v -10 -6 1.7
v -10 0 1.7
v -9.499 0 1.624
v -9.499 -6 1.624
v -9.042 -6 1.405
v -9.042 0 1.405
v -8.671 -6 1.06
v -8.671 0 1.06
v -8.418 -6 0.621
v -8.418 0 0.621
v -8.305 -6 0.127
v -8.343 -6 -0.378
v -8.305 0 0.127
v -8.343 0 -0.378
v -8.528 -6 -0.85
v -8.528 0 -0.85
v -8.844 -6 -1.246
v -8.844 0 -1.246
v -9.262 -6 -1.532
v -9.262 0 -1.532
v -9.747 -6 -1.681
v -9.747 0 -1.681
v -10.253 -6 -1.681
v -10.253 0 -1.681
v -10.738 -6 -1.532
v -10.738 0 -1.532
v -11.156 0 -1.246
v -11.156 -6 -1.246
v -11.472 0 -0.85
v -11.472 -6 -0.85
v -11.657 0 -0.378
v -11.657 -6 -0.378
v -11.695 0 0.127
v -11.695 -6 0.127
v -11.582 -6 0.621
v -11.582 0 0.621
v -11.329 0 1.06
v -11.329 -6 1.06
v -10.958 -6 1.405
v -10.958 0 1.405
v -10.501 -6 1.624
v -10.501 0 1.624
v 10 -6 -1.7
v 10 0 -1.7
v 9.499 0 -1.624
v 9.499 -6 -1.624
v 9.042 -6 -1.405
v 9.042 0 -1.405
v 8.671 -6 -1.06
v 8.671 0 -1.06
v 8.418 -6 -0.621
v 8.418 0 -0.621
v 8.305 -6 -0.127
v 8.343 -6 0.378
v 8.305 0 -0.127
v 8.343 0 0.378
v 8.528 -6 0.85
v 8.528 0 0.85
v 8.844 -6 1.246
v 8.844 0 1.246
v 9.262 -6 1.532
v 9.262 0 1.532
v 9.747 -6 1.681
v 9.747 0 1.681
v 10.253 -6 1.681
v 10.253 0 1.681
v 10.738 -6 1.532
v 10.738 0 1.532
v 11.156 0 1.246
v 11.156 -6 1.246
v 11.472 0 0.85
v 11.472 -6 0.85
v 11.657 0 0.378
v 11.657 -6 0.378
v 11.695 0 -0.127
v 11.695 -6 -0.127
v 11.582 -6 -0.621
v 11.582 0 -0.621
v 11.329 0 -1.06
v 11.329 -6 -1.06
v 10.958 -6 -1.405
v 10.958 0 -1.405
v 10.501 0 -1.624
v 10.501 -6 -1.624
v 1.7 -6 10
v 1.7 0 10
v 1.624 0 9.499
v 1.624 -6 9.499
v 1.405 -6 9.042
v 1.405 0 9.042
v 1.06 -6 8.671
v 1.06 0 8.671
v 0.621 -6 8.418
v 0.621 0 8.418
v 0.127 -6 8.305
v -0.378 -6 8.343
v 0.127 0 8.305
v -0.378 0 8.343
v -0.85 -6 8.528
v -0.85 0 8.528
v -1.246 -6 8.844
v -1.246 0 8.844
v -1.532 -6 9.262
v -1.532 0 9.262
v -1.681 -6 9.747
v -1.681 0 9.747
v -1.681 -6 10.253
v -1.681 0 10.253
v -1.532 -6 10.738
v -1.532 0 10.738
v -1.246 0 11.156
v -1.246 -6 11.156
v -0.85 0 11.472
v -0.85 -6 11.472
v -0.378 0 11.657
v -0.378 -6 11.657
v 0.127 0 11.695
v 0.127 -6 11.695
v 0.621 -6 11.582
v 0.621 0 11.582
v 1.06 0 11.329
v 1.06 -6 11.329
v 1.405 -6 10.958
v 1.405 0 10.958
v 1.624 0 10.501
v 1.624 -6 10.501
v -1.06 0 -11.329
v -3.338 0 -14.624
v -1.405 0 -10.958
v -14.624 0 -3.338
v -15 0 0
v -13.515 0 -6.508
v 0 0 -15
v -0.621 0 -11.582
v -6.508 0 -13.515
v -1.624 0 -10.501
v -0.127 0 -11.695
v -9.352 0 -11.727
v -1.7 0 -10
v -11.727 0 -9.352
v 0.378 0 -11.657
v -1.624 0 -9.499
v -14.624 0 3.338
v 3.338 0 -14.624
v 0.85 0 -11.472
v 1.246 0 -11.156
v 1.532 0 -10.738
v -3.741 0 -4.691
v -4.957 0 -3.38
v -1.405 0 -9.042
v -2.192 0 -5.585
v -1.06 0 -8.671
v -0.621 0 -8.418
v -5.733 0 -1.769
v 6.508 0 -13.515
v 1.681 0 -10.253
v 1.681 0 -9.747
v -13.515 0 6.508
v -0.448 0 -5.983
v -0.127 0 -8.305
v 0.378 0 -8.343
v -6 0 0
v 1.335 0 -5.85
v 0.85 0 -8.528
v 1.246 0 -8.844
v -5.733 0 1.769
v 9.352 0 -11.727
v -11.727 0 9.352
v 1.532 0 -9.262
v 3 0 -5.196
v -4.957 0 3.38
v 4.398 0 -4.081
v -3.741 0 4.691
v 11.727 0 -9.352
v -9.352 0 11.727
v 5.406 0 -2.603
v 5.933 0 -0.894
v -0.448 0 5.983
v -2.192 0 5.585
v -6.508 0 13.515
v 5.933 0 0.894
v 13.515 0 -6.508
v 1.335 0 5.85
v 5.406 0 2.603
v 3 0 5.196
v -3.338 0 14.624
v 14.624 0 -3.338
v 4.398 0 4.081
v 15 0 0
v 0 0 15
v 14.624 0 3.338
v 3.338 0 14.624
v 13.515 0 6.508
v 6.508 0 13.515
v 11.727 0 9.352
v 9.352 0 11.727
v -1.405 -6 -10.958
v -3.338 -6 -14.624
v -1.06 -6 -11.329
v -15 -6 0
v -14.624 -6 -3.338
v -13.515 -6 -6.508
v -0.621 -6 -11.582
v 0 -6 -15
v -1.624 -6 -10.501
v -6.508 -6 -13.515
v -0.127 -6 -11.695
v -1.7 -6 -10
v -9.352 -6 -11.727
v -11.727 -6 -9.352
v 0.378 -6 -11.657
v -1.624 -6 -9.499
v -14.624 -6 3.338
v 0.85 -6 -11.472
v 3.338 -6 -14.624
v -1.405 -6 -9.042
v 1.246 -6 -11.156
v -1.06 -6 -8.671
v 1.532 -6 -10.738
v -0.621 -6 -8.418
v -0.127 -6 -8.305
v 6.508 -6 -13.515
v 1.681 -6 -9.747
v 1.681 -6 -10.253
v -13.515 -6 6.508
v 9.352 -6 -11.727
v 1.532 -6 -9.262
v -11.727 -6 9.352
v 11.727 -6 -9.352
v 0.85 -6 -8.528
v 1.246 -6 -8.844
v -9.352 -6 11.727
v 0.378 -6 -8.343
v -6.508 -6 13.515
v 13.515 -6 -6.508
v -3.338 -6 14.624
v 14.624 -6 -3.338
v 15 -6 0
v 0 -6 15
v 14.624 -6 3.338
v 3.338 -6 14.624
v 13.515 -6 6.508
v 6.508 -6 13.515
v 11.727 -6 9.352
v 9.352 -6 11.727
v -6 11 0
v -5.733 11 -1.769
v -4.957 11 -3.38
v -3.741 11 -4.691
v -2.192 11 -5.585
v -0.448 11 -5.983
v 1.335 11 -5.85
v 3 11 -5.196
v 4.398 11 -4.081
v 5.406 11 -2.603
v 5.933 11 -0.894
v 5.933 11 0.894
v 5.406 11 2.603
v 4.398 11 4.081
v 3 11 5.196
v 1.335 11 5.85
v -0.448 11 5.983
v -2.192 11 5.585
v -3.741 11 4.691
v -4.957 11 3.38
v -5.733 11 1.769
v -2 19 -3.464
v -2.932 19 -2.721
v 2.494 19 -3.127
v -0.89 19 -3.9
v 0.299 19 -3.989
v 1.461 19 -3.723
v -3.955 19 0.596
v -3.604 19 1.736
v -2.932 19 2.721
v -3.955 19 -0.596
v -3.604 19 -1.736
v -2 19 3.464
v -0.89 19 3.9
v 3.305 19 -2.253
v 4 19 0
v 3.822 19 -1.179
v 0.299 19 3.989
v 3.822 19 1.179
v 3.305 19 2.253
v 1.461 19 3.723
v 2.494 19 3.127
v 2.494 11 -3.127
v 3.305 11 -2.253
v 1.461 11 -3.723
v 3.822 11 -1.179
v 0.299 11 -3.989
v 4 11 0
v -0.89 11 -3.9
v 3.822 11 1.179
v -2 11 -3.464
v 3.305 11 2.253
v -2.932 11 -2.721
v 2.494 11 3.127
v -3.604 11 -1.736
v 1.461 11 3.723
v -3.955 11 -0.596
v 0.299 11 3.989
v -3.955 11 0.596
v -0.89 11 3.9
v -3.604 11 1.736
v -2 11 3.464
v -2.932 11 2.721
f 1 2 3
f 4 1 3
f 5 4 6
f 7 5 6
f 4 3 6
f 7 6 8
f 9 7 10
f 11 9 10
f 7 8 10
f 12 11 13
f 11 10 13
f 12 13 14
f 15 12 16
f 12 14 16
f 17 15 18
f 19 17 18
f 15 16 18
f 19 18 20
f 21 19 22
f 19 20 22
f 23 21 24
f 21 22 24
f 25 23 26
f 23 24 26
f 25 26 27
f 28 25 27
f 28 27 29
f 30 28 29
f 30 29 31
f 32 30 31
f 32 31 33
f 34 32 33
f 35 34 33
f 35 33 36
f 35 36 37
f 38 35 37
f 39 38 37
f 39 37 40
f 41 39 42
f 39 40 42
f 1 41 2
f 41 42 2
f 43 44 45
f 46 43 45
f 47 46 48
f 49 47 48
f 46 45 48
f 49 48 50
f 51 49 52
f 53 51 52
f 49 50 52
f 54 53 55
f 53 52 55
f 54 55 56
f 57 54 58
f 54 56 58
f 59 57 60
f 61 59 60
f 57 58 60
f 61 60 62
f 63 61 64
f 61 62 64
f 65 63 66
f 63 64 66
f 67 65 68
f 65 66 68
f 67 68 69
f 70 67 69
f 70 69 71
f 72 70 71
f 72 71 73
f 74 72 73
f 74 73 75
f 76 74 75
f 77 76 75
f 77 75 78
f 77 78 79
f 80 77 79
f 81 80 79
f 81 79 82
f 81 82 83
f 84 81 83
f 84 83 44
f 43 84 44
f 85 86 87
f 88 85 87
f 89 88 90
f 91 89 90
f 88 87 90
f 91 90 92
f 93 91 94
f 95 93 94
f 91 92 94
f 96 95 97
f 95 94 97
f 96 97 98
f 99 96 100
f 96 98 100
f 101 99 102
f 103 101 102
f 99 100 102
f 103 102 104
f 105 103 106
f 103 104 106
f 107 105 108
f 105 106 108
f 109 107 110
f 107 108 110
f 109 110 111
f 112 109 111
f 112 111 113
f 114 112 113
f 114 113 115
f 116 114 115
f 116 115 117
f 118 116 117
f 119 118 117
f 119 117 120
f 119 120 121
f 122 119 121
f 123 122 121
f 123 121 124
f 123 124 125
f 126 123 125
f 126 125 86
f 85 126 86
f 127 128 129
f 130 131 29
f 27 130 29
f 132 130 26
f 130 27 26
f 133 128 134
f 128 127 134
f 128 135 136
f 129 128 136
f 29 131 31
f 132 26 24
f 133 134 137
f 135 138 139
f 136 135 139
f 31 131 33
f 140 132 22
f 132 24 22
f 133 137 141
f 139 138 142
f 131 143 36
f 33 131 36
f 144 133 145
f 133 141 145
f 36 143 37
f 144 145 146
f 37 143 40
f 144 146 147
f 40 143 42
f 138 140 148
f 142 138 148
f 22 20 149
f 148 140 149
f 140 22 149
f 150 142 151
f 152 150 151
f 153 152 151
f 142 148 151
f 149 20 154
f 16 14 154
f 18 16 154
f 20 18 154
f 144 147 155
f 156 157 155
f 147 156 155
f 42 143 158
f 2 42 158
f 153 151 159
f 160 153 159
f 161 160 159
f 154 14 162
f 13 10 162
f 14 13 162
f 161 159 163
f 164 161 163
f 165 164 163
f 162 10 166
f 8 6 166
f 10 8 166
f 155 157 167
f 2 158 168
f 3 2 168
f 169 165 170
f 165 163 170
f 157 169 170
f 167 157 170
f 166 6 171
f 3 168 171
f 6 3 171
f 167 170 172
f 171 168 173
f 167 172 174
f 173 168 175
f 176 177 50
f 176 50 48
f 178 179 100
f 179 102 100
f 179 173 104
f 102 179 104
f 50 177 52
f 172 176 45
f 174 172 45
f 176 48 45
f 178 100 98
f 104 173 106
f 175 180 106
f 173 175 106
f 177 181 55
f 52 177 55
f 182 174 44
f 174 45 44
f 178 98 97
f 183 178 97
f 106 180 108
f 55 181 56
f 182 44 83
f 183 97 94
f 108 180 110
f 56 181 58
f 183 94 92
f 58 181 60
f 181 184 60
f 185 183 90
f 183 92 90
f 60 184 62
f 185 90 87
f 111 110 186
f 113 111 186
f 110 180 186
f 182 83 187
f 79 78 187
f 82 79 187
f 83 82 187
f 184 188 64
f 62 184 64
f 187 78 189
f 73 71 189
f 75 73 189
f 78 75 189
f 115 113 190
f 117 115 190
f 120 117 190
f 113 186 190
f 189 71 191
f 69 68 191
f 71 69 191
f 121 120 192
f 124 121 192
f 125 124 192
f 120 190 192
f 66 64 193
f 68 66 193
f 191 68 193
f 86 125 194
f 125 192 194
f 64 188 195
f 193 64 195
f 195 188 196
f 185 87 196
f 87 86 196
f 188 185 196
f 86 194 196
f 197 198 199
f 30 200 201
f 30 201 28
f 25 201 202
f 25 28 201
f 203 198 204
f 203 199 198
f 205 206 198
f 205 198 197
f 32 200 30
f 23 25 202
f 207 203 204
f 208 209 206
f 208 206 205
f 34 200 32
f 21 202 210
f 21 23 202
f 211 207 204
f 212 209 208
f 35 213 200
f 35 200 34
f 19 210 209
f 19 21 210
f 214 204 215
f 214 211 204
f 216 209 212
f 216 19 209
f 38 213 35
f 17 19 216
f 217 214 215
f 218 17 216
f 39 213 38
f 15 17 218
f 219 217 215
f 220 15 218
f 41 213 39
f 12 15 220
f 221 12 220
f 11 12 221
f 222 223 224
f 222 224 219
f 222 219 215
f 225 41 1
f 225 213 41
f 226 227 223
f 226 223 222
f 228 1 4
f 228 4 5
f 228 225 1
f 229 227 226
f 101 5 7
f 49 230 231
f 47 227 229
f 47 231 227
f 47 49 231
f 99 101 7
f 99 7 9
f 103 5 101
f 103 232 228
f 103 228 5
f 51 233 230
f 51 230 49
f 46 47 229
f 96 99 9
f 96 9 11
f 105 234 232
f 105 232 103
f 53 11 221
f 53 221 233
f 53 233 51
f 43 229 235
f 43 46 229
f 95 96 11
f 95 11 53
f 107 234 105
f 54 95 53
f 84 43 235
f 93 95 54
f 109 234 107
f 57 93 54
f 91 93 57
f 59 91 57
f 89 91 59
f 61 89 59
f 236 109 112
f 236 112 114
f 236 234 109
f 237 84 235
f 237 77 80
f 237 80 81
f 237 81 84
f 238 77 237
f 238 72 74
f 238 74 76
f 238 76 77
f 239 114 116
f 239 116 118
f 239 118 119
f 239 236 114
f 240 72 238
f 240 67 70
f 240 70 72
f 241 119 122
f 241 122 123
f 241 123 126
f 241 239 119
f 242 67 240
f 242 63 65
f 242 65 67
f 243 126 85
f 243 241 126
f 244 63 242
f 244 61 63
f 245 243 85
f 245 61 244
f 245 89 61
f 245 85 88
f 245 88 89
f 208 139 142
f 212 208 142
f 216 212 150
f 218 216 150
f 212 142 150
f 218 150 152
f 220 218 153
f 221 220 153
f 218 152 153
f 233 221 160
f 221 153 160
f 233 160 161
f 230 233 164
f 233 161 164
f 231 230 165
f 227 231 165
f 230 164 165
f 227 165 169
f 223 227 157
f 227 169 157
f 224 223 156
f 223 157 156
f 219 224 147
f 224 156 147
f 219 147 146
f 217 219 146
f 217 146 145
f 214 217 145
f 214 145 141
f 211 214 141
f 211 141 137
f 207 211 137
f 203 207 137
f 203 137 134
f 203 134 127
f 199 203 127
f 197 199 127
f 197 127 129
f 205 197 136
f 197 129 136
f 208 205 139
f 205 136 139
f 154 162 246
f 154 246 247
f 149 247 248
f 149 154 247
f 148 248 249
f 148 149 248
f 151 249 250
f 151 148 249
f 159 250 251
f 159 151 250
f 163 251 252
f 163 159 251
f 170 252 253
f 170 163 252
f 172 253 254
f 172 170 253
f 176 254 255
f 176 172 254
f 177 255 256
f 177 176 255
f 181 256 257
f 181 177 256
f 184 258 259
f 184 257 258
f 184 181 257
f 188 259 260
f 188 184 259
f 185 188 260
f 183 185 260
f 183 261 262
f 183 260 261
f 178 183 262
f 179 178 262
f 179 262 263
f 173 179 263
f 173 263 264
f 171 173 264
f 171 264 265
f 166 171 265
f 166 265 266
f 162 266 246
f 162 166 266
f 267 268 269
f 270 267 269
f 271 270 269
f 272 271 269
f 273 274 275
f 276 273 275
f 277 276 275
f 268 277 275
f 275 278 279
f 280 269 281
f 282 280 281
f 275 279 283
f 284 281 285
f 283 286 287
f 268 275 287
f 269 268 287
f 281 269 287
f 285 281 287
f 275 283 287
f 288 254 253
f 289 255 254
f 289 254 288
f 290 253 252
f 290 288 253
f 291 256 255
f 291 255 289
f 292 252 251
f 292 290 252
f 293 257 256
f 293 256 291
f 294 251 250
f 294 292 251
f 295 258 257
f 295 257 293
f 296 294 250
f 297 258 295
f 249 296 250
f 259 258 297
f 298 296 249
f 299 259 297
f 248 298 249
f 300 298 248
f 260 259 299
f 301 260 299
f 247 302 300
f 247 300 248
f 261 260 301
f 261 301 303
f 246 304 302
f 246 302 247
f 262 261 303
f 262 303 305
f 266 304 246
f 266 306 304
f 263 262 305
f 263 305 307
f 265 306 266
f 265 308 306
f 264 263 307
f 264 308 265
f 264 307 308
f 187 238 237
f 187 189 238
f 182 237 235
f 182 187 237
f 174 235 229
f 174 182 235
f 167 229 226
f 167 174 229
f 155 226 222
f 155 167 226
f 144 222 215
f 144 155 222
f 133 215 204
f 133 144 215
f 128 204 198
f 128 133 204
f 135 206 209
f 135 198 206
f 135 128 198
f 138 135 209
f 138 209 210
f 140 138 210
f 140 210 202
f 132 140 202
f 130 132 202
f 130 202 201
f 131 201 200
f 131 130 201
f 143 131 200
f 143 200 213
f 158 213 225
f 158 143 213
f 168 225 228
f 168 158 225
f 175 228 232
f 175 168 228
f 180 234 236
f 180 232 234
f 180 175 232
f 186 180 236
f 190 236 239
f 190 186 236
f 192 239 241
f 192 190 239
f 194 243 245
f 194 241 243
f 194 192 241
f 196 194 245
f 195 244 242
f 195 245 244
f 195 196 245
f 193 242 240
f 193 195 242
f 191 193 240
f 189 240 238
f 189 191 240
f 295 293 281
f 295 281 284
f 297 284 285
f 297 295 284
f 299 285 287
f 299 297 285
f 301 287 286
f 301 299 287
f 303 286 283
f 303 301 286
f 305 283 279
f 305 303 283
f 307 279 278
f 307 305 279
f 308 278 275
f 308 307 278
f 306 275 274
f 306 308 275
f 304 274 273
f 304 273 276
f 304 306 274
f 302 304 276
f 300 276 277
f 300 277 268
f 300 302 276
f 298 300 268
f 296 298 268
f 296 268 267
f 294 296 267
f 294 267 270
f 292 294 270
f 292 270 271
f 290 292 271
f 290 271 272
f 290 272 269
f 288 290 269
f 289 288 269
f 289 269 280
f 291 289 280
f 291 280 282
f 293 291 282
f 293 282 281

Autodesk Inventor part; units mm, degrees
ref_plane "YZ Plane" through (0, 0, 0) normal (1, 0, 0) x (0, 1, 0)
ref_plane "XZ Plane" through (0, 0, 0) normal (0, 1, 0) x (-1, 0, 0)
ref_plane "XY Plane" through (0, 0, 0) normal (0, 0, 1) x (1, 0, 0)
sketch "Skizze1" plane through (0, 0, 0) normal (0, 1, 0) x (-1, 0, 0)
  circle A0 centre (0, 0) radius 6
  dimension "d0" = 12
extrude "Extrusion1" add sketch "Skizze1" along normal blind 11
sketch "Skizze2" plane through (0, 0, 0) normal (0, -1, 0) x (1, 0, 0)
  circle A0 centre (0, 0) radius 4
  dimension "d3" = 8
extrude "Extrusion2" add sketch "Skizze2" against normal blind 19
sketch "Skizze3" plane through (0, 0, 0) normal (0, -1, 0) x (1, 0, 0)
  circle A0 centre (0, 0) radius 15
  dimension "d6" = 30
extrude "Extrusion3" add sketch "Skizze3" along normal blind 6
sketch "Skizze4" plane through (0, -6, 0) normal (0, -1, 0) x (1, 0, 0)
  point P0 (0, 0)
  point P1 (10, 0)
  dimension "d9" = 10
hole "Bohrung1" at (10, -6, 0) direction (0, 1, 0) diameter 3.4 end through all clearance for "Inbusschraube ISO 4762" size "M3" standard "ISO"
pattern_circular "Runde Anordnung1" count 4 over 360 about axis through (0, 0, 0) along (0, -1, 0) of "Bohrung1"
properties part number "dynamixel_pro_frame_shaft"
